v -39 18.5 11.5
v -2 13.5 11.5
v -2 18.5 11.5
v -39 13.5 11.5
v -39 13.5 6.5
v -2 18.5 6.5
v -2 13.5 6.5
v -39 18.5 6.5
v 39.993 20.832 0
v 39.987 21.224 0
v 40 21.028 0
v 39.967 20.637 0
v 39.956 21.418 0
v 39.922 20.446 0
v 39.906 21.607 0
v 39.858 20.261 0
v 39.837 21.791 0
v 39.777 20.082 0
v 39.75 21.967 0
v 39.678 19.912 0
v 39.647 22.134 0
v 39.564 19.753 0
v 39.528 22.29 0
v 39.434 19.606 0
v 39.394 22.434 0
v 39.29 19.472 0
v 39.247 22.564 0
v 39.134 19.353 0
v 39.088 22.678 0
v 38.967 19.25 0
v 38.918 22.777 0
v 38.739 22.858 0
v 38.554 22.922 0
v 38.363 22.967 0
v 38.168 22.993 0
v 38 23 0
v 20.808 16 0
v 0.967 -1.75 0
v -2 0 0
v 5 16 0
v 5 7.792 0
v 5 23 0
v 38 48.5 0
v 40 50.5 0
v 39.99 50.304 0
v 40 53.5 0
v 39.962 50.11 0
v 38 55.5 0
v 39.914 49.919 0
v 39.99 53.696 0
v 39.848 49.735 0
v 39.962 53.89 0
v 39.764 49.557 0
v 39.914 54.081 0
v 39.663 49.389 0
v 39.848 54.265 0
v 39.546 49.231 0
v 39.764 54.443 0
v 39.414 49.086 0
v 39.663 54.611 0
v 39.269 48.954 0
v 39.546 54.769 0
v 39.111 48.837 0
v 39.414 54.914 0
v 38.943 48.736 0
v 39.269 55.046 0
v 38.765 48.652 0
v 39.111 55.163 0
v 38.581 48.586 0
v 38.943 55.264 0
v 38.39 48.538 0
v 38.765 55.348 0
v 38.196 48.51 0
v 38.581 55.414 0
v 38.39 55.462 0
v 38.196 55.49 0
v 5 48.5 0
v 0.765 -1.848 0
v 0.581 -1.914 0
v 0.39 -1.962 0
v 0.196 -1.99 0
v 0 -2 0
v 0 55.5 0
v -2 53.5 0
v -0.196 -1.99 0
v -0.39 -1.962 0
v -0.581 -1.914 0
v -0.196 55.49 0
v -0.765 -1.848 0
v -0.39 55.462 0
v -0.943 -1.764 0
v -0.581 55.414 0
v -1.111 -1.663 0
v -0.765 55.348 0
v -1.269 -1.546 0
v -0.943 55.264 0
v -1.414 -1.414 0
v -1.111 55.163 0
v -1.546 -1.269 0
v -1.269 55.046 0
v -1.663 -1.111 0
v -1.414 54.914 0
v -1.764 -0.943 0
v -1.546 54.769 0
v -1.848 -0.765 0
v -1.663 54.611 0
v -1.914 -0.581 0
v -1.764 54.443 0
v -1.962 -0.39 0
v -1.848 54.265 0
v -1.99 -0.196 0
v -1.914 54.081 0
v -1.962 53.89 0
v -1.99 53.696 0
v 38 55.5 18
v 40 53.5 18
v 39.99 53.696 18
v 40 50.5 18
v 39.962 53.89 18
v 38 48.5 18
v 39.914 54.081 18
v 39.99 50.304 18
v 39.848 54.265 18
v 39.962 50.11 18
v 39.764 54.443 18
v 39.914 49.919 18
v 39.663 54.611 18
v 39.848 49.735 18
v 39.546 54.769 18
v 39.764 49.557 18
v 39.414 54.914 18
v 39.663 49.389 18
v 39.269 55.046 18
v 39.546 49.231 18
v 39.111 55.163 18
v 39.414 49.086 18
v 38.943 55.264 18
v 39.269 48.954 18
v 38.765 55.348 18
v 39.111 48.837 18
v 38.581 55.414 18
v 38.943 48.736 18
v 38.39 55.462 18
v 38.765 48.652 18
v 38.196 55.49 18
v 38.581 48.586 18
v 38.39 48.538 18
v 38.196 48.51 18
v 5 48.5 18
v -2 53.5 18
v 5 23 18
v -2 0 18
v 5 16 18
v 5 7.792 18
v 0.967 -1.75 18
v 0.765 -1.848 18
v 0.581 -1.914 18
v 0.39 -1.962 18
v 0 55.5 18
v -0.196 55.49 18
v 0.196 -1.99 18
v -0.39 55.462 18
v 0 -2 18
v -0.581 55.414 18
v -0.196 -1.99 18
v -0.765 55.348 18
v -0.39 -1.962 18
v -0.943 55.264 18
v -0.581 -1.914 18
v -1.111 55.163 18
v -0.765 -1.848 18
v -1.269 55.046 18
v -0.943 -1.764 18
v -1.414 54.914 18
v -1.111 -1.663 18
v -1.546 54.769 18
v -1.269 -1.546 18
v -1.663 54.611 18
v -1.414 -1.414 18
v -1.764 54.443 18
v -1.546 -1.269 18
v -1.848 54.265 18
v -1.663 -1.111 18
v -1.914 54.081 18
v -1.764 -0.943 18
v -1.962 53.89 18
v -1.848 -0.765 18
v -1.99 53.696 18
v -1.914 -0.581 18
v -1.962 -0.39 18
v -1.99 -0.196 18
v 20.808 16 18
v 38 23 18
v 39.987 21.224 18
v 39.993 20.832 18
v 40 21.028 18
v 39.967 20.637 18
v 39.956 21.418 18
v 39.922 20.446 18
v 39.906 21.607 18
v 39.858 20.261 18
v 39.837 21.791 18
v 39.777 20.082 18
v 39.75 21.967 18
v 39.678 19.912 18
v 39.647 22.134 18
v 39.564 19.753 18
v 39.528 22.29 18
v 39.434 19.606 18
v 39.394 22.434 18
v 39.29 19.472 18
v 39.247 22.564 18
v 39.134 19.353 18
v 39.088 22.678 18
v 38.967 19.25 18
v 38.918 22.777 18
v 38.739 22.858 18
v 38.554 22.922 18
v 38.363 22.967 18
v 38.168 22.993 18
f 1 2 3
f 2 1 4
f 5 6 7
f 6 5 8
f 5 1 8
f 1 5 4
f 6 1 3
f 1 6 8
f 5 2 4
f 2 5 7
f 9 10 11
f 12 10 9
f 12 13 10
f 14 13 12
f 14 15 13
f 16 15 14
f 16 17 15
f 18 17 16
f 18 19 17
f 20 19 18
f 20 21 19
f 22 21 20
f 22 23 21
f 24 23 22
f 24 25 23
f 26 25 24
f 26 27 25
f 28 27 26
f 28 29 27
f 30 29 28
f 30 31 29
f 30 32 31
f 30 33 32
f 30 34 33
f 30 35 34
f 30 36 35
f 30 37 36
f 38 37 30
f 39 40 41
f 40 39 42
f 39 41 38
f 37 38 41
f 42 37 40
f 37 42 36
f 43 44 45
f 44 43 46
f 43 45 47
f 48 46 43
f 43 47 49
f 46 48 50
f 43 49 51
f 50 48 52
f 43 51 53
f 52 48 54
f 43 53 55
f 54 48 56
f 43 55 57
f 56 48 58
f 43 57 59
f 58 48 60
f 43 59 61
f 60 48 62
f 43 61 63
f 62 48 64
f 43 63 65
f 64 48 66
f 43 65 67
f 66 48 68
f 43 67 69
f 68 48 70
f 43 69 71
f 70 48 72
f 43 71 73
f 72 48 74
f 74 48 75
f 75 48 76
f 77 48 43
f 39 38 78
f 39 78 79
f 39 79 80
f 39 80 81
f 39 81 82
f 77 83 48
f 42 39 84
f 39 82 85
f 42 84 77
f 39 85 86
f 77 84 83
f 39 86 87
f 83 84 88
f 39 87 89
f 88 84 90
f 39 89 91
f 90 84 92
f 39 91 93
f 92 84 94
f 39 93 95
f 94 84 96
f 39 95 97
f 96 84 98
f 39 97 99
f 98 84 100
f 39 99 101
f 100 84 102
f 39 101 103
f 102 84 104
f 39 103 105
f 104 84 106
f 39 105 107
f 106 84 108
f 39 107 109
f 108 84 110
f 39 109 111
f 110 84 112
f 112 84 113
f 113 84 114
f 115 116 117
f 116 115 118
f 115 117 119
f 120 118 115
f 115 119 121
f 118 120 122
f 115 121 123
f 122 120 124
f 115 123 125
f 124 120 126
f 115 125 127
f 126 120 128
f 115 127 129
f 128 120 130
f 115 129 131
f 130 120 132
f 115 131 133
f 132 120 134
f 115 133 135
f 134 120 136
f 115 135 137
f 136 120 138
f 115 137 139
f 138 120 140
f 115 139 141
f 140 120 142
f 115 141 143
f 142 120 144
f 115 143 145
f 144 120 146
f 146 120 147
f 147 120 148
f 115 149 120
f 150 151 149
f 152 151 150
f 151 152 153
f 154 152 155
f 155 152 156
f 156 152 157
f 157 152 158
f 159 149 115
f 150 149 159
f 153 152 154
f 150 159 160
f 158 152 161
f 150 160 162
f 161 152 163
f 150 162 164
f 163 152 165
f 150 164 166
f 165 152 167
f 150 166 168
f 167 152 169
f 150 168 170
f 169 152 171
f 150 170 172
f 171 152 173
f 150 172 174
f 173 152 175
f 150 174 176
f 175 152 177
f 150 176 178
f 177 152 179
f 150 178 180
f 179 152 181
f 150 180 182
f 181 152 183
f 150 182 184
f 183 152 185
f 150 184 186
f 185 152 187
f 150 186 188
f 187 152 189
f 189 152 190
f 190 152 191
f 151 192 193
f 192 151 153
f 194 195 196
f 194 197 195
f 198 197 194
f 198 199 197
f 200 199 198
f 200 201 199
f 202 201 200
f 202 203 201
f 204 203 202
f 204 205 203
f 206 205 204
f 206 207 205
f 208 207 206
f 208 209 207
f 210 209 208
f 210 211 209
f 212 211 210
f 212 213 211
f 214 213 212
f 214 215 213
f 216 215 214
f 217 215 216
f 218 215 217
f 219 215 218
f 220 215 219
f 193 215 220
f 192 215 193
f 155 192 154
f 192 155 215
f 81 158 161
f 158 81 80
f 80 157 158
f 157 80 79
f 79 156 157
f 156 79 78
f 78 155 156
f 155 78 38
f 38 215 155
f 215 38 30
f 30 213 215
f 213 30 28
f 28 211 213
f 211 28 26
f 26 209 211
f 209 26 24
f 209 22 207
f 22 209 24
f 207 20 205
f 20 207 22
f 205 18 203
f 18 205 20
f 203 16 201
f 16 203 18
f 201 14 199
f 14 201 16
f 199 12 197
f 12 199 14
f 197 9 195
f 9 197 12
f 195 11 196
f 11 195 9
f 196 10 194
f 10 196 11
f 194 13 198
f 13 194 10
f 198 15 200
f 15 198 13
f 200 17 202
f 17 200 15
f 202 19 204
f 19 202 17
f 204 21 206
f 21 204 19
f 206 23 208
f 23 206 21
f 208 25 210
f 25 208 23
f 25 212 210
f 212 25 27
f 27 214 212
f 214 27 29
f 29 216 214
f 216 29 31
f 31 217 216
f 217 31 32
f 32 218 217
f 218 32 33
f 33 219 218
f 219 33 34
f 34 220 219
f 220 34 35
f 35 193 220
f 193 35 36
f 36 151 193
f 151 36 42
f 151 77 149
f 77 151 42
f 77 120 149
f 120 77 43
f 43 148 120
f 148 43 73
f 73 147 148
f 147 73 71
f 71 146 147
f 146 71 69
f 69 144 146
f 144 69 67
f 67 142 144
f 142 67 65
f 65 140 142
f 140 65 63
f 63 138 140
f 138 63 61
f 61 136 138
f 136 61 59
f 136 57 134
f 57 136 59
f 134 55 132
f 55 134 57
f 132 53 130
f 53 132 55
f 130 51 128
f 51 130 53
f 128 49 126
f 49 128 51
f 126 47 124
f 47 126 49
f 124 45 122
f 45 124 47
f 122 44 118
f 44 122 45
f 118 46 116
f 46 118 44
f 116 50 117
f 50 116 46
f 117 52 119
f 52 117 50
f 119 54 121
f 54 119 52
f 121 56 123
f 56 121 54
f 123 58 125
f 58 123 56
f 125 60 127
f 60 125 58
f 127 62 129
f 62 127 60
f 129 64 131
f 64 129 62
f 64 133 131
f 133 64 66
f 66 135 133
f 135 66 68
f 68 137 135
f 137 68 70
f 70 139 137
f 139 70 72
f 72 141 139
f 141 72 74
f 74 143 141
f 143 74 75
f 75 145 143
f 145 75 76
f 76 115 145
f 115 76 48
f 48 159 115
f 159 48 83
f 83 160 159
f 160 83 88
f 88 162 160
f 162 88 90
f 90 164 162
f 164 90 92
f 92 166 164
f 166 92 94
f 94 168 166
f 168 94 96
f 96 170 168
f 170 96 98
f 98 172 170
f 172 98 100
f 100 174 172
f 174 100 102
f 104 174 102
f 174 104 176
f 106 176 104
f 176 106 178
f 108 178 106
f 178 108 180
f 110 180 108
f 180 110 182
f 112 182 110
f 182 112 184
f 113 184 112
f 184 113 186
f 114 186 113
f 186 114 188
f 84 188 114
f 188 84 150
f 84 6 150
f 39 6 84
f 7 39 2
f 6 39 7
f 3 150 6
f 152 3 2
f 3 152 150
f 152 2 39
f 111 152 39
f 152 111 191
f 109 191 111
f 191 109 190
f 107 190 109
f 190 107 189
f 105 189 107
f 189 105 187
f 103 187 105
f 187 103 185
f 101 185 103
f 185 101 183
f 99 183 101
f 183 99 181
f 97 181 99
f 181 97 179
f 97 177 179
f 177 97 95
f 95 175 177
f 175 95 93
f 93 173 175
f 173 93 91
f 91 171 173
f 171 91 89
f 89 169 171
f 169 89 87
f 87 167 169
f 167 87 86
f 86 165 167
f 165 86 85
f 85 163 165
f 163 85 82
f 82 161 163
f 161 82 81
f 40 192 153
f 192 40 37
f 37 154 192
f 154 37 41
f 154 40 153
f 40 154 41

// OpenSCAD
//headphone holder mount
//dwu

holder_thickness = 5; // thickness
holder_width = 20; // width
holder_depth = 40; // how far in to extend

desk_thickness = 25.5; // thickness of desk
desk_underhang = 20; // how far under desk

peg_t = 5; // thickness
peg_l = 40; // length

rad = 2; // radius of edges

hold_t = holder_thickness - rad;
hold_w = holder_width - rad;
hold_d = holder_depth - rad;

desk_t = desk_thickness+rad*2;
desk_u = desk_underhang - rad;

$fn = 64; //smoothness

translate([-peg_l+1,desk_u*0.75,(hold_w/2)-(peg_t/2)]) {
  cube([peg_l,peg_t,peg_t]);
}

brace_pts = [
//main body
  [0,0],                             //0
  [0,desk_u+desk_t+(hold_t*2)],      //1
  [hold_d,desk_u+desk_t+(hold_t*2)], //2
  [hold_d,desk_u+desk_t+hold_t],     //3
  [hold_t,desk_u+desk_t+hold_t],     //4
  [hold_t,desk_u+hold_t],            //5
  [hold_d,desk_u+hold_t],            //6
//cutout
  [hold_t,desk_u],                   //7
  [hold_d-hold_t*3,desk_u],          //8
  [hold_t,hold_t*1.5]                //9
];

brace_paths = [
  [0,1,2,3,4,5,6],
  [7,8,9]
];

linear_extrude(height = hold_w, center = false) {
  offset(r=rad) {
      polygon(points = brace_pts, paths = brace_paths);
  }
}
